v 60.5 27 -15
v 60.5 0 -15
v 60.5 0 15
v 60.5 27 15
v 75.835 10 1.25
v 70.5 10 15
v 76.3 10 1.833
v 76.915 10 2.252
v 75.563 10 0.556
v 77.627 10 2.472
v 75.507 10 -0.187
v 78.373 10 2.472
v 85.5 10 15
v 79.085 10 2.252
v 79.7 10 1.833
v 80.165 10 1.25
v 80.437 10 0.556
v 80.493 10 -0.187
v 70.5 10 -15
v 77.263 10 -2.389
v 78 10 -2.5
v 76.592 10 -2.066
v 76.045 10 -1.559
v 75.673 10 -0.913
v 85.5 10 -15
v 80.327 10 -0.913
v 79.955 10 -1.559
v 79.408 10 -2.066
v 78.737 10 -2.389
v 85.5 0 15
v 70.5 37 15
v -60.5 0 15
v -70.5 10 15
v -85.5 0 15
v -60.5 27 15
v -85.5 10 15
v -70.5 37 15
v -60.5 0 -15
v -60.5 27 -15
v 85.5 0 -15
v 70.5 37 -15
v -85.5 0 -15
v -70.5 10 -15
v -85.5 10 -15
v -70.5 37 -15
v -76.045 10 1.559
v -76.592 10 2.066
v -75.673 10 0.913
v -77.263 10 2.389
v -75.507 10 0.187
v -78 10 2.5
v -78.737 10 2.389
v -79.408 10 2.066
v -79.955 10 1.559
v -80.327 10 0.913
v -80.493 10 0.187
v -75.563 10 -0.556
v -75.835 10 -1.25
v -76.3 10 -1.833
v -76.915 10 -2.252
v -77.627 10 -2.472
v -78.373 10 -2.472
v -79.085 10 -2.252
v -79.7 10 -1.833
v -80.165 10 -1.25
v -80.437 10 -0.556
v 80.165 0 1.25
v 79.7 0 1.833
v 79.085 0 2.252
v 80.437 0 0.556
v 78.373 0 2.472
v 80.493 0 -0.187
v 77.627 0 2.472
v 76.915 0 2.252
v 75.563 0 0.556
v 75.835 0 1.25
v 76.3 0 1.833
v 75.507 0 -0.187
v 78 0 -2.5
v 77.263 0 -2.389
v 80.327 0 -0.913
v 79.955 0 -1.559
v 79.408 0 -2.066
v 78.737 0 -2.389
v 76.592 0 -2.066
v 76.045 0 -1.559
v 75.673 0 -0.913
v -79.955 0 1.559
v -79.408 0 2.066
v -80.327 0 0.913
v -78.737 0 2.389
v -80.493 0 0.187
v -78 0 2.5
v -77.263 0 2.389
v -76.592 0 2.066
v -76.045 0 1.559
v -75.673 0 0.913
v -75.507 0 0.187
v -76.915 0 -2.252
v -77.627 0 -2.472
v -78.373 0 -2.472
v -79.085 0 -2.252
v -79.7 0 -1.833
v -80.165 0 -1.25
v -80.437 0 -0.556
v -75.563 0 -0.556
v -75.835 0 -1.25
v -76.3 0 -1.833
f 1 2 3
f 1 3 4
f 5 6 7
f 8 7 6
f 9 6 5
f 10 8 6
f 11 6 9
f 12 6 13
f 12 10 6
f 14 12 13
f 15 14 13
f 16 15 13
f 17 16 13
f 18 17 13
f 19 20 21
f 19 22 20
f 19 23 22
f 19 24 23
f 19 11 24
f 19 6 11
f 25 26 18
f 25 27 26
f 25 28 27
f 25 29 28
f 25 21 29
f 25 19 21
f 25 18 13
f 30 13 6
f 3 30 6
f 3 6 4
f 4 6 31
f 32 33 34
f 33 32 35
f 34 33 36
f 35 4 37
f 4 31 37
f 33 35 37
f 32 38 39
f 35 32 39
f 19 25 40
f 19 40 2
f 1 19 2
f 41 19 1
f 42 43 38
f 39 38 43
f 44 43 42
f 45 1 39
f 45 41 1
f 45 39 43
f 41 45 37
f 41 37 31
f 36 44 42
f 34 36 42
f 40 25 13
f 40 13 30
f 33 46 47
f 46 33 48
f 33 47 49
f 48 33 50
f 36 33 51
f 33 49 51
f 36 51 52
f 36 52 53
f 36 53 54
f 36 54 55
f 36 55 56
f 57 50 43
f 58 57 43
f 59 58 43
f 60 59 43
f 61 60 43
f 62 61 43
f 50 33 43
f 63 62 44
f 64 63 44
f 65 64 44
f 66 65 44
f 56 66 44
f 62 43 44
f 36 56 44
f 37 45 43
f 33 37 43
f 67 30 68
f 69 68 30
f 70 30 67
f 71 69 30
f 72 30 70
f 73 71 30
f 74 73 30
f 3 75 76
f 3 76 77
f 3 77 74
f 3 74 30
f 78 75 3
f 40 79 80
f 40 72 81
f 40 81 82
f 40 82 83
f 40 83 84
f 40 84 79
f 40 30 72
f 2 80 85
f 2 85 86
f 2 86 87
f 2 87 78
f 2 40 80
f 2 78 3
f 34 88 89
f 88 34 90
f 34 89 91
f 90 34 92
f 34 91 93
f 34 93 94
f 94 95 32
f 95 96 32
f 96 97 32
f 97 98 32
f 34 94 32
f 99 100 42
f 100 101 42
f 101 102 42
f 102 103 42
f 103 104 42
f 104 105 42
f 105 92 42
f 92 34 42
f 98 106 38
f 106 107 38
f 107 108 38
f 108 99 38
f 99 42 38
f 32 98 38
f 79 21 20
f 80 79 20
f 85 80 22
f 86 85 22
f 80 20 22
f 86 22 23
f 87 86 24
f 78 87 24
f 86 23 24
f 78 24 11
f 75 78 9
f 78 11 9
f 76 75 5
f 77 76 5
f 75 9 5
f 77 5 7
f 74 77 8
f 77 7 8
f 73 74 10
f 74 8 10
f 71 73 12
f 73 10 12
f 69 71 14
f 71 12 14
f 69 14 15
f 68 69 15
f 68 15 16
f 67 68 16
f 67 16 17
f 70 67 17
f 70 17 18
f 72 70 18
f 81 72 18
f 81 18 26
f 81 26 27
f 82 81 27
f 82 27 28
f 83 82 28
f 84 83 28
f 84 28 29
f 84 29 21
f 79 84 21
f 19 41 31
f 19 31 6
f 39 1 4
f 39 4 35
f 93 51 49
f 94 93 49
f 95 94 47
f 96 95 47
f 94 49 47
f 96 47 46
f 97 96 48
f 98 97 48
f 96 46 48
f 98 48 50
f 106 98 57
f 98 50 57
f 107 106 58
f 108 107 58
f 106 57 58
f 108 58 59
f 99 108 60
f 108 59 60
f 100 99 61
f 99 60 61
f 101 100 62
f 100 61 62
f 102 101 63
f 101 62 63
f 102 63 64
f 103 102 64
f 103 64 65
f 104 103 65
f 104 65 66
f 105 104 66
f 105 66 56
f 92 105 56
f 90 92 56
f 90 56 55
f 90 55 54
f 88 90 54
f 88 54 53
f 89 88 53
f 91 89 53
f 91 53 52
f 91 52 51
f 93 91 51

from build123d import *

# Parameters (mm, degrees)
BOSS_EXTRUDE1_DEPTH      = 15
BOSS_EXTRUDE1_DEPTH_BACK = 15
SKETCH3_R                = 2.5
CUT_EXTRUDE1_DEPTH       = 15


with BuildPart() as part:
    # Sketch2 → Boss-Extrude1 (new, two sides: drawn at the far end of the back side and taken through both)
    with BuildSketch(Plane.XY.offset(-BOSS_EXTRUDE1_DEPTH_BACK)):
        Polygon((-60.5, 0), (-60.5, 27), (0, 27), (0, 37), (-70.5, 37), (-70.5, 10), (-85.5, 10), (-85.5, 0), align=None)
    extrude(amount=BOSS_EXTRUDE1_DEPTH + BOSS_EXTRUDE1_DEPTH_BACK)

    # Mirror1: part across plane


with BuildPart() as part_1:
    add(part.part)
    add(part.part.mirror(Plane(origin=(0, 0, 0), x_dir=(0, 0, 1), z_dir=(1, 0, 0))))

    # Sketch3 → Cut-Extrude1 (cut)
    with BuildSketch(Plane(origin=(0, 10, 0), x_dir=(1, 0, 0), z_dir=(0, 1, 0))):
        with Locations((-78, 0)):
            Circle(SKETCH3_R)
        with Locations((78, 0)):
            Circle(SKETCH3_R)
    extrude(amount=-CUT_EXTRUDE1_DEPTH, mode=Mode.SUBTRACT)


solid = part_1.part
